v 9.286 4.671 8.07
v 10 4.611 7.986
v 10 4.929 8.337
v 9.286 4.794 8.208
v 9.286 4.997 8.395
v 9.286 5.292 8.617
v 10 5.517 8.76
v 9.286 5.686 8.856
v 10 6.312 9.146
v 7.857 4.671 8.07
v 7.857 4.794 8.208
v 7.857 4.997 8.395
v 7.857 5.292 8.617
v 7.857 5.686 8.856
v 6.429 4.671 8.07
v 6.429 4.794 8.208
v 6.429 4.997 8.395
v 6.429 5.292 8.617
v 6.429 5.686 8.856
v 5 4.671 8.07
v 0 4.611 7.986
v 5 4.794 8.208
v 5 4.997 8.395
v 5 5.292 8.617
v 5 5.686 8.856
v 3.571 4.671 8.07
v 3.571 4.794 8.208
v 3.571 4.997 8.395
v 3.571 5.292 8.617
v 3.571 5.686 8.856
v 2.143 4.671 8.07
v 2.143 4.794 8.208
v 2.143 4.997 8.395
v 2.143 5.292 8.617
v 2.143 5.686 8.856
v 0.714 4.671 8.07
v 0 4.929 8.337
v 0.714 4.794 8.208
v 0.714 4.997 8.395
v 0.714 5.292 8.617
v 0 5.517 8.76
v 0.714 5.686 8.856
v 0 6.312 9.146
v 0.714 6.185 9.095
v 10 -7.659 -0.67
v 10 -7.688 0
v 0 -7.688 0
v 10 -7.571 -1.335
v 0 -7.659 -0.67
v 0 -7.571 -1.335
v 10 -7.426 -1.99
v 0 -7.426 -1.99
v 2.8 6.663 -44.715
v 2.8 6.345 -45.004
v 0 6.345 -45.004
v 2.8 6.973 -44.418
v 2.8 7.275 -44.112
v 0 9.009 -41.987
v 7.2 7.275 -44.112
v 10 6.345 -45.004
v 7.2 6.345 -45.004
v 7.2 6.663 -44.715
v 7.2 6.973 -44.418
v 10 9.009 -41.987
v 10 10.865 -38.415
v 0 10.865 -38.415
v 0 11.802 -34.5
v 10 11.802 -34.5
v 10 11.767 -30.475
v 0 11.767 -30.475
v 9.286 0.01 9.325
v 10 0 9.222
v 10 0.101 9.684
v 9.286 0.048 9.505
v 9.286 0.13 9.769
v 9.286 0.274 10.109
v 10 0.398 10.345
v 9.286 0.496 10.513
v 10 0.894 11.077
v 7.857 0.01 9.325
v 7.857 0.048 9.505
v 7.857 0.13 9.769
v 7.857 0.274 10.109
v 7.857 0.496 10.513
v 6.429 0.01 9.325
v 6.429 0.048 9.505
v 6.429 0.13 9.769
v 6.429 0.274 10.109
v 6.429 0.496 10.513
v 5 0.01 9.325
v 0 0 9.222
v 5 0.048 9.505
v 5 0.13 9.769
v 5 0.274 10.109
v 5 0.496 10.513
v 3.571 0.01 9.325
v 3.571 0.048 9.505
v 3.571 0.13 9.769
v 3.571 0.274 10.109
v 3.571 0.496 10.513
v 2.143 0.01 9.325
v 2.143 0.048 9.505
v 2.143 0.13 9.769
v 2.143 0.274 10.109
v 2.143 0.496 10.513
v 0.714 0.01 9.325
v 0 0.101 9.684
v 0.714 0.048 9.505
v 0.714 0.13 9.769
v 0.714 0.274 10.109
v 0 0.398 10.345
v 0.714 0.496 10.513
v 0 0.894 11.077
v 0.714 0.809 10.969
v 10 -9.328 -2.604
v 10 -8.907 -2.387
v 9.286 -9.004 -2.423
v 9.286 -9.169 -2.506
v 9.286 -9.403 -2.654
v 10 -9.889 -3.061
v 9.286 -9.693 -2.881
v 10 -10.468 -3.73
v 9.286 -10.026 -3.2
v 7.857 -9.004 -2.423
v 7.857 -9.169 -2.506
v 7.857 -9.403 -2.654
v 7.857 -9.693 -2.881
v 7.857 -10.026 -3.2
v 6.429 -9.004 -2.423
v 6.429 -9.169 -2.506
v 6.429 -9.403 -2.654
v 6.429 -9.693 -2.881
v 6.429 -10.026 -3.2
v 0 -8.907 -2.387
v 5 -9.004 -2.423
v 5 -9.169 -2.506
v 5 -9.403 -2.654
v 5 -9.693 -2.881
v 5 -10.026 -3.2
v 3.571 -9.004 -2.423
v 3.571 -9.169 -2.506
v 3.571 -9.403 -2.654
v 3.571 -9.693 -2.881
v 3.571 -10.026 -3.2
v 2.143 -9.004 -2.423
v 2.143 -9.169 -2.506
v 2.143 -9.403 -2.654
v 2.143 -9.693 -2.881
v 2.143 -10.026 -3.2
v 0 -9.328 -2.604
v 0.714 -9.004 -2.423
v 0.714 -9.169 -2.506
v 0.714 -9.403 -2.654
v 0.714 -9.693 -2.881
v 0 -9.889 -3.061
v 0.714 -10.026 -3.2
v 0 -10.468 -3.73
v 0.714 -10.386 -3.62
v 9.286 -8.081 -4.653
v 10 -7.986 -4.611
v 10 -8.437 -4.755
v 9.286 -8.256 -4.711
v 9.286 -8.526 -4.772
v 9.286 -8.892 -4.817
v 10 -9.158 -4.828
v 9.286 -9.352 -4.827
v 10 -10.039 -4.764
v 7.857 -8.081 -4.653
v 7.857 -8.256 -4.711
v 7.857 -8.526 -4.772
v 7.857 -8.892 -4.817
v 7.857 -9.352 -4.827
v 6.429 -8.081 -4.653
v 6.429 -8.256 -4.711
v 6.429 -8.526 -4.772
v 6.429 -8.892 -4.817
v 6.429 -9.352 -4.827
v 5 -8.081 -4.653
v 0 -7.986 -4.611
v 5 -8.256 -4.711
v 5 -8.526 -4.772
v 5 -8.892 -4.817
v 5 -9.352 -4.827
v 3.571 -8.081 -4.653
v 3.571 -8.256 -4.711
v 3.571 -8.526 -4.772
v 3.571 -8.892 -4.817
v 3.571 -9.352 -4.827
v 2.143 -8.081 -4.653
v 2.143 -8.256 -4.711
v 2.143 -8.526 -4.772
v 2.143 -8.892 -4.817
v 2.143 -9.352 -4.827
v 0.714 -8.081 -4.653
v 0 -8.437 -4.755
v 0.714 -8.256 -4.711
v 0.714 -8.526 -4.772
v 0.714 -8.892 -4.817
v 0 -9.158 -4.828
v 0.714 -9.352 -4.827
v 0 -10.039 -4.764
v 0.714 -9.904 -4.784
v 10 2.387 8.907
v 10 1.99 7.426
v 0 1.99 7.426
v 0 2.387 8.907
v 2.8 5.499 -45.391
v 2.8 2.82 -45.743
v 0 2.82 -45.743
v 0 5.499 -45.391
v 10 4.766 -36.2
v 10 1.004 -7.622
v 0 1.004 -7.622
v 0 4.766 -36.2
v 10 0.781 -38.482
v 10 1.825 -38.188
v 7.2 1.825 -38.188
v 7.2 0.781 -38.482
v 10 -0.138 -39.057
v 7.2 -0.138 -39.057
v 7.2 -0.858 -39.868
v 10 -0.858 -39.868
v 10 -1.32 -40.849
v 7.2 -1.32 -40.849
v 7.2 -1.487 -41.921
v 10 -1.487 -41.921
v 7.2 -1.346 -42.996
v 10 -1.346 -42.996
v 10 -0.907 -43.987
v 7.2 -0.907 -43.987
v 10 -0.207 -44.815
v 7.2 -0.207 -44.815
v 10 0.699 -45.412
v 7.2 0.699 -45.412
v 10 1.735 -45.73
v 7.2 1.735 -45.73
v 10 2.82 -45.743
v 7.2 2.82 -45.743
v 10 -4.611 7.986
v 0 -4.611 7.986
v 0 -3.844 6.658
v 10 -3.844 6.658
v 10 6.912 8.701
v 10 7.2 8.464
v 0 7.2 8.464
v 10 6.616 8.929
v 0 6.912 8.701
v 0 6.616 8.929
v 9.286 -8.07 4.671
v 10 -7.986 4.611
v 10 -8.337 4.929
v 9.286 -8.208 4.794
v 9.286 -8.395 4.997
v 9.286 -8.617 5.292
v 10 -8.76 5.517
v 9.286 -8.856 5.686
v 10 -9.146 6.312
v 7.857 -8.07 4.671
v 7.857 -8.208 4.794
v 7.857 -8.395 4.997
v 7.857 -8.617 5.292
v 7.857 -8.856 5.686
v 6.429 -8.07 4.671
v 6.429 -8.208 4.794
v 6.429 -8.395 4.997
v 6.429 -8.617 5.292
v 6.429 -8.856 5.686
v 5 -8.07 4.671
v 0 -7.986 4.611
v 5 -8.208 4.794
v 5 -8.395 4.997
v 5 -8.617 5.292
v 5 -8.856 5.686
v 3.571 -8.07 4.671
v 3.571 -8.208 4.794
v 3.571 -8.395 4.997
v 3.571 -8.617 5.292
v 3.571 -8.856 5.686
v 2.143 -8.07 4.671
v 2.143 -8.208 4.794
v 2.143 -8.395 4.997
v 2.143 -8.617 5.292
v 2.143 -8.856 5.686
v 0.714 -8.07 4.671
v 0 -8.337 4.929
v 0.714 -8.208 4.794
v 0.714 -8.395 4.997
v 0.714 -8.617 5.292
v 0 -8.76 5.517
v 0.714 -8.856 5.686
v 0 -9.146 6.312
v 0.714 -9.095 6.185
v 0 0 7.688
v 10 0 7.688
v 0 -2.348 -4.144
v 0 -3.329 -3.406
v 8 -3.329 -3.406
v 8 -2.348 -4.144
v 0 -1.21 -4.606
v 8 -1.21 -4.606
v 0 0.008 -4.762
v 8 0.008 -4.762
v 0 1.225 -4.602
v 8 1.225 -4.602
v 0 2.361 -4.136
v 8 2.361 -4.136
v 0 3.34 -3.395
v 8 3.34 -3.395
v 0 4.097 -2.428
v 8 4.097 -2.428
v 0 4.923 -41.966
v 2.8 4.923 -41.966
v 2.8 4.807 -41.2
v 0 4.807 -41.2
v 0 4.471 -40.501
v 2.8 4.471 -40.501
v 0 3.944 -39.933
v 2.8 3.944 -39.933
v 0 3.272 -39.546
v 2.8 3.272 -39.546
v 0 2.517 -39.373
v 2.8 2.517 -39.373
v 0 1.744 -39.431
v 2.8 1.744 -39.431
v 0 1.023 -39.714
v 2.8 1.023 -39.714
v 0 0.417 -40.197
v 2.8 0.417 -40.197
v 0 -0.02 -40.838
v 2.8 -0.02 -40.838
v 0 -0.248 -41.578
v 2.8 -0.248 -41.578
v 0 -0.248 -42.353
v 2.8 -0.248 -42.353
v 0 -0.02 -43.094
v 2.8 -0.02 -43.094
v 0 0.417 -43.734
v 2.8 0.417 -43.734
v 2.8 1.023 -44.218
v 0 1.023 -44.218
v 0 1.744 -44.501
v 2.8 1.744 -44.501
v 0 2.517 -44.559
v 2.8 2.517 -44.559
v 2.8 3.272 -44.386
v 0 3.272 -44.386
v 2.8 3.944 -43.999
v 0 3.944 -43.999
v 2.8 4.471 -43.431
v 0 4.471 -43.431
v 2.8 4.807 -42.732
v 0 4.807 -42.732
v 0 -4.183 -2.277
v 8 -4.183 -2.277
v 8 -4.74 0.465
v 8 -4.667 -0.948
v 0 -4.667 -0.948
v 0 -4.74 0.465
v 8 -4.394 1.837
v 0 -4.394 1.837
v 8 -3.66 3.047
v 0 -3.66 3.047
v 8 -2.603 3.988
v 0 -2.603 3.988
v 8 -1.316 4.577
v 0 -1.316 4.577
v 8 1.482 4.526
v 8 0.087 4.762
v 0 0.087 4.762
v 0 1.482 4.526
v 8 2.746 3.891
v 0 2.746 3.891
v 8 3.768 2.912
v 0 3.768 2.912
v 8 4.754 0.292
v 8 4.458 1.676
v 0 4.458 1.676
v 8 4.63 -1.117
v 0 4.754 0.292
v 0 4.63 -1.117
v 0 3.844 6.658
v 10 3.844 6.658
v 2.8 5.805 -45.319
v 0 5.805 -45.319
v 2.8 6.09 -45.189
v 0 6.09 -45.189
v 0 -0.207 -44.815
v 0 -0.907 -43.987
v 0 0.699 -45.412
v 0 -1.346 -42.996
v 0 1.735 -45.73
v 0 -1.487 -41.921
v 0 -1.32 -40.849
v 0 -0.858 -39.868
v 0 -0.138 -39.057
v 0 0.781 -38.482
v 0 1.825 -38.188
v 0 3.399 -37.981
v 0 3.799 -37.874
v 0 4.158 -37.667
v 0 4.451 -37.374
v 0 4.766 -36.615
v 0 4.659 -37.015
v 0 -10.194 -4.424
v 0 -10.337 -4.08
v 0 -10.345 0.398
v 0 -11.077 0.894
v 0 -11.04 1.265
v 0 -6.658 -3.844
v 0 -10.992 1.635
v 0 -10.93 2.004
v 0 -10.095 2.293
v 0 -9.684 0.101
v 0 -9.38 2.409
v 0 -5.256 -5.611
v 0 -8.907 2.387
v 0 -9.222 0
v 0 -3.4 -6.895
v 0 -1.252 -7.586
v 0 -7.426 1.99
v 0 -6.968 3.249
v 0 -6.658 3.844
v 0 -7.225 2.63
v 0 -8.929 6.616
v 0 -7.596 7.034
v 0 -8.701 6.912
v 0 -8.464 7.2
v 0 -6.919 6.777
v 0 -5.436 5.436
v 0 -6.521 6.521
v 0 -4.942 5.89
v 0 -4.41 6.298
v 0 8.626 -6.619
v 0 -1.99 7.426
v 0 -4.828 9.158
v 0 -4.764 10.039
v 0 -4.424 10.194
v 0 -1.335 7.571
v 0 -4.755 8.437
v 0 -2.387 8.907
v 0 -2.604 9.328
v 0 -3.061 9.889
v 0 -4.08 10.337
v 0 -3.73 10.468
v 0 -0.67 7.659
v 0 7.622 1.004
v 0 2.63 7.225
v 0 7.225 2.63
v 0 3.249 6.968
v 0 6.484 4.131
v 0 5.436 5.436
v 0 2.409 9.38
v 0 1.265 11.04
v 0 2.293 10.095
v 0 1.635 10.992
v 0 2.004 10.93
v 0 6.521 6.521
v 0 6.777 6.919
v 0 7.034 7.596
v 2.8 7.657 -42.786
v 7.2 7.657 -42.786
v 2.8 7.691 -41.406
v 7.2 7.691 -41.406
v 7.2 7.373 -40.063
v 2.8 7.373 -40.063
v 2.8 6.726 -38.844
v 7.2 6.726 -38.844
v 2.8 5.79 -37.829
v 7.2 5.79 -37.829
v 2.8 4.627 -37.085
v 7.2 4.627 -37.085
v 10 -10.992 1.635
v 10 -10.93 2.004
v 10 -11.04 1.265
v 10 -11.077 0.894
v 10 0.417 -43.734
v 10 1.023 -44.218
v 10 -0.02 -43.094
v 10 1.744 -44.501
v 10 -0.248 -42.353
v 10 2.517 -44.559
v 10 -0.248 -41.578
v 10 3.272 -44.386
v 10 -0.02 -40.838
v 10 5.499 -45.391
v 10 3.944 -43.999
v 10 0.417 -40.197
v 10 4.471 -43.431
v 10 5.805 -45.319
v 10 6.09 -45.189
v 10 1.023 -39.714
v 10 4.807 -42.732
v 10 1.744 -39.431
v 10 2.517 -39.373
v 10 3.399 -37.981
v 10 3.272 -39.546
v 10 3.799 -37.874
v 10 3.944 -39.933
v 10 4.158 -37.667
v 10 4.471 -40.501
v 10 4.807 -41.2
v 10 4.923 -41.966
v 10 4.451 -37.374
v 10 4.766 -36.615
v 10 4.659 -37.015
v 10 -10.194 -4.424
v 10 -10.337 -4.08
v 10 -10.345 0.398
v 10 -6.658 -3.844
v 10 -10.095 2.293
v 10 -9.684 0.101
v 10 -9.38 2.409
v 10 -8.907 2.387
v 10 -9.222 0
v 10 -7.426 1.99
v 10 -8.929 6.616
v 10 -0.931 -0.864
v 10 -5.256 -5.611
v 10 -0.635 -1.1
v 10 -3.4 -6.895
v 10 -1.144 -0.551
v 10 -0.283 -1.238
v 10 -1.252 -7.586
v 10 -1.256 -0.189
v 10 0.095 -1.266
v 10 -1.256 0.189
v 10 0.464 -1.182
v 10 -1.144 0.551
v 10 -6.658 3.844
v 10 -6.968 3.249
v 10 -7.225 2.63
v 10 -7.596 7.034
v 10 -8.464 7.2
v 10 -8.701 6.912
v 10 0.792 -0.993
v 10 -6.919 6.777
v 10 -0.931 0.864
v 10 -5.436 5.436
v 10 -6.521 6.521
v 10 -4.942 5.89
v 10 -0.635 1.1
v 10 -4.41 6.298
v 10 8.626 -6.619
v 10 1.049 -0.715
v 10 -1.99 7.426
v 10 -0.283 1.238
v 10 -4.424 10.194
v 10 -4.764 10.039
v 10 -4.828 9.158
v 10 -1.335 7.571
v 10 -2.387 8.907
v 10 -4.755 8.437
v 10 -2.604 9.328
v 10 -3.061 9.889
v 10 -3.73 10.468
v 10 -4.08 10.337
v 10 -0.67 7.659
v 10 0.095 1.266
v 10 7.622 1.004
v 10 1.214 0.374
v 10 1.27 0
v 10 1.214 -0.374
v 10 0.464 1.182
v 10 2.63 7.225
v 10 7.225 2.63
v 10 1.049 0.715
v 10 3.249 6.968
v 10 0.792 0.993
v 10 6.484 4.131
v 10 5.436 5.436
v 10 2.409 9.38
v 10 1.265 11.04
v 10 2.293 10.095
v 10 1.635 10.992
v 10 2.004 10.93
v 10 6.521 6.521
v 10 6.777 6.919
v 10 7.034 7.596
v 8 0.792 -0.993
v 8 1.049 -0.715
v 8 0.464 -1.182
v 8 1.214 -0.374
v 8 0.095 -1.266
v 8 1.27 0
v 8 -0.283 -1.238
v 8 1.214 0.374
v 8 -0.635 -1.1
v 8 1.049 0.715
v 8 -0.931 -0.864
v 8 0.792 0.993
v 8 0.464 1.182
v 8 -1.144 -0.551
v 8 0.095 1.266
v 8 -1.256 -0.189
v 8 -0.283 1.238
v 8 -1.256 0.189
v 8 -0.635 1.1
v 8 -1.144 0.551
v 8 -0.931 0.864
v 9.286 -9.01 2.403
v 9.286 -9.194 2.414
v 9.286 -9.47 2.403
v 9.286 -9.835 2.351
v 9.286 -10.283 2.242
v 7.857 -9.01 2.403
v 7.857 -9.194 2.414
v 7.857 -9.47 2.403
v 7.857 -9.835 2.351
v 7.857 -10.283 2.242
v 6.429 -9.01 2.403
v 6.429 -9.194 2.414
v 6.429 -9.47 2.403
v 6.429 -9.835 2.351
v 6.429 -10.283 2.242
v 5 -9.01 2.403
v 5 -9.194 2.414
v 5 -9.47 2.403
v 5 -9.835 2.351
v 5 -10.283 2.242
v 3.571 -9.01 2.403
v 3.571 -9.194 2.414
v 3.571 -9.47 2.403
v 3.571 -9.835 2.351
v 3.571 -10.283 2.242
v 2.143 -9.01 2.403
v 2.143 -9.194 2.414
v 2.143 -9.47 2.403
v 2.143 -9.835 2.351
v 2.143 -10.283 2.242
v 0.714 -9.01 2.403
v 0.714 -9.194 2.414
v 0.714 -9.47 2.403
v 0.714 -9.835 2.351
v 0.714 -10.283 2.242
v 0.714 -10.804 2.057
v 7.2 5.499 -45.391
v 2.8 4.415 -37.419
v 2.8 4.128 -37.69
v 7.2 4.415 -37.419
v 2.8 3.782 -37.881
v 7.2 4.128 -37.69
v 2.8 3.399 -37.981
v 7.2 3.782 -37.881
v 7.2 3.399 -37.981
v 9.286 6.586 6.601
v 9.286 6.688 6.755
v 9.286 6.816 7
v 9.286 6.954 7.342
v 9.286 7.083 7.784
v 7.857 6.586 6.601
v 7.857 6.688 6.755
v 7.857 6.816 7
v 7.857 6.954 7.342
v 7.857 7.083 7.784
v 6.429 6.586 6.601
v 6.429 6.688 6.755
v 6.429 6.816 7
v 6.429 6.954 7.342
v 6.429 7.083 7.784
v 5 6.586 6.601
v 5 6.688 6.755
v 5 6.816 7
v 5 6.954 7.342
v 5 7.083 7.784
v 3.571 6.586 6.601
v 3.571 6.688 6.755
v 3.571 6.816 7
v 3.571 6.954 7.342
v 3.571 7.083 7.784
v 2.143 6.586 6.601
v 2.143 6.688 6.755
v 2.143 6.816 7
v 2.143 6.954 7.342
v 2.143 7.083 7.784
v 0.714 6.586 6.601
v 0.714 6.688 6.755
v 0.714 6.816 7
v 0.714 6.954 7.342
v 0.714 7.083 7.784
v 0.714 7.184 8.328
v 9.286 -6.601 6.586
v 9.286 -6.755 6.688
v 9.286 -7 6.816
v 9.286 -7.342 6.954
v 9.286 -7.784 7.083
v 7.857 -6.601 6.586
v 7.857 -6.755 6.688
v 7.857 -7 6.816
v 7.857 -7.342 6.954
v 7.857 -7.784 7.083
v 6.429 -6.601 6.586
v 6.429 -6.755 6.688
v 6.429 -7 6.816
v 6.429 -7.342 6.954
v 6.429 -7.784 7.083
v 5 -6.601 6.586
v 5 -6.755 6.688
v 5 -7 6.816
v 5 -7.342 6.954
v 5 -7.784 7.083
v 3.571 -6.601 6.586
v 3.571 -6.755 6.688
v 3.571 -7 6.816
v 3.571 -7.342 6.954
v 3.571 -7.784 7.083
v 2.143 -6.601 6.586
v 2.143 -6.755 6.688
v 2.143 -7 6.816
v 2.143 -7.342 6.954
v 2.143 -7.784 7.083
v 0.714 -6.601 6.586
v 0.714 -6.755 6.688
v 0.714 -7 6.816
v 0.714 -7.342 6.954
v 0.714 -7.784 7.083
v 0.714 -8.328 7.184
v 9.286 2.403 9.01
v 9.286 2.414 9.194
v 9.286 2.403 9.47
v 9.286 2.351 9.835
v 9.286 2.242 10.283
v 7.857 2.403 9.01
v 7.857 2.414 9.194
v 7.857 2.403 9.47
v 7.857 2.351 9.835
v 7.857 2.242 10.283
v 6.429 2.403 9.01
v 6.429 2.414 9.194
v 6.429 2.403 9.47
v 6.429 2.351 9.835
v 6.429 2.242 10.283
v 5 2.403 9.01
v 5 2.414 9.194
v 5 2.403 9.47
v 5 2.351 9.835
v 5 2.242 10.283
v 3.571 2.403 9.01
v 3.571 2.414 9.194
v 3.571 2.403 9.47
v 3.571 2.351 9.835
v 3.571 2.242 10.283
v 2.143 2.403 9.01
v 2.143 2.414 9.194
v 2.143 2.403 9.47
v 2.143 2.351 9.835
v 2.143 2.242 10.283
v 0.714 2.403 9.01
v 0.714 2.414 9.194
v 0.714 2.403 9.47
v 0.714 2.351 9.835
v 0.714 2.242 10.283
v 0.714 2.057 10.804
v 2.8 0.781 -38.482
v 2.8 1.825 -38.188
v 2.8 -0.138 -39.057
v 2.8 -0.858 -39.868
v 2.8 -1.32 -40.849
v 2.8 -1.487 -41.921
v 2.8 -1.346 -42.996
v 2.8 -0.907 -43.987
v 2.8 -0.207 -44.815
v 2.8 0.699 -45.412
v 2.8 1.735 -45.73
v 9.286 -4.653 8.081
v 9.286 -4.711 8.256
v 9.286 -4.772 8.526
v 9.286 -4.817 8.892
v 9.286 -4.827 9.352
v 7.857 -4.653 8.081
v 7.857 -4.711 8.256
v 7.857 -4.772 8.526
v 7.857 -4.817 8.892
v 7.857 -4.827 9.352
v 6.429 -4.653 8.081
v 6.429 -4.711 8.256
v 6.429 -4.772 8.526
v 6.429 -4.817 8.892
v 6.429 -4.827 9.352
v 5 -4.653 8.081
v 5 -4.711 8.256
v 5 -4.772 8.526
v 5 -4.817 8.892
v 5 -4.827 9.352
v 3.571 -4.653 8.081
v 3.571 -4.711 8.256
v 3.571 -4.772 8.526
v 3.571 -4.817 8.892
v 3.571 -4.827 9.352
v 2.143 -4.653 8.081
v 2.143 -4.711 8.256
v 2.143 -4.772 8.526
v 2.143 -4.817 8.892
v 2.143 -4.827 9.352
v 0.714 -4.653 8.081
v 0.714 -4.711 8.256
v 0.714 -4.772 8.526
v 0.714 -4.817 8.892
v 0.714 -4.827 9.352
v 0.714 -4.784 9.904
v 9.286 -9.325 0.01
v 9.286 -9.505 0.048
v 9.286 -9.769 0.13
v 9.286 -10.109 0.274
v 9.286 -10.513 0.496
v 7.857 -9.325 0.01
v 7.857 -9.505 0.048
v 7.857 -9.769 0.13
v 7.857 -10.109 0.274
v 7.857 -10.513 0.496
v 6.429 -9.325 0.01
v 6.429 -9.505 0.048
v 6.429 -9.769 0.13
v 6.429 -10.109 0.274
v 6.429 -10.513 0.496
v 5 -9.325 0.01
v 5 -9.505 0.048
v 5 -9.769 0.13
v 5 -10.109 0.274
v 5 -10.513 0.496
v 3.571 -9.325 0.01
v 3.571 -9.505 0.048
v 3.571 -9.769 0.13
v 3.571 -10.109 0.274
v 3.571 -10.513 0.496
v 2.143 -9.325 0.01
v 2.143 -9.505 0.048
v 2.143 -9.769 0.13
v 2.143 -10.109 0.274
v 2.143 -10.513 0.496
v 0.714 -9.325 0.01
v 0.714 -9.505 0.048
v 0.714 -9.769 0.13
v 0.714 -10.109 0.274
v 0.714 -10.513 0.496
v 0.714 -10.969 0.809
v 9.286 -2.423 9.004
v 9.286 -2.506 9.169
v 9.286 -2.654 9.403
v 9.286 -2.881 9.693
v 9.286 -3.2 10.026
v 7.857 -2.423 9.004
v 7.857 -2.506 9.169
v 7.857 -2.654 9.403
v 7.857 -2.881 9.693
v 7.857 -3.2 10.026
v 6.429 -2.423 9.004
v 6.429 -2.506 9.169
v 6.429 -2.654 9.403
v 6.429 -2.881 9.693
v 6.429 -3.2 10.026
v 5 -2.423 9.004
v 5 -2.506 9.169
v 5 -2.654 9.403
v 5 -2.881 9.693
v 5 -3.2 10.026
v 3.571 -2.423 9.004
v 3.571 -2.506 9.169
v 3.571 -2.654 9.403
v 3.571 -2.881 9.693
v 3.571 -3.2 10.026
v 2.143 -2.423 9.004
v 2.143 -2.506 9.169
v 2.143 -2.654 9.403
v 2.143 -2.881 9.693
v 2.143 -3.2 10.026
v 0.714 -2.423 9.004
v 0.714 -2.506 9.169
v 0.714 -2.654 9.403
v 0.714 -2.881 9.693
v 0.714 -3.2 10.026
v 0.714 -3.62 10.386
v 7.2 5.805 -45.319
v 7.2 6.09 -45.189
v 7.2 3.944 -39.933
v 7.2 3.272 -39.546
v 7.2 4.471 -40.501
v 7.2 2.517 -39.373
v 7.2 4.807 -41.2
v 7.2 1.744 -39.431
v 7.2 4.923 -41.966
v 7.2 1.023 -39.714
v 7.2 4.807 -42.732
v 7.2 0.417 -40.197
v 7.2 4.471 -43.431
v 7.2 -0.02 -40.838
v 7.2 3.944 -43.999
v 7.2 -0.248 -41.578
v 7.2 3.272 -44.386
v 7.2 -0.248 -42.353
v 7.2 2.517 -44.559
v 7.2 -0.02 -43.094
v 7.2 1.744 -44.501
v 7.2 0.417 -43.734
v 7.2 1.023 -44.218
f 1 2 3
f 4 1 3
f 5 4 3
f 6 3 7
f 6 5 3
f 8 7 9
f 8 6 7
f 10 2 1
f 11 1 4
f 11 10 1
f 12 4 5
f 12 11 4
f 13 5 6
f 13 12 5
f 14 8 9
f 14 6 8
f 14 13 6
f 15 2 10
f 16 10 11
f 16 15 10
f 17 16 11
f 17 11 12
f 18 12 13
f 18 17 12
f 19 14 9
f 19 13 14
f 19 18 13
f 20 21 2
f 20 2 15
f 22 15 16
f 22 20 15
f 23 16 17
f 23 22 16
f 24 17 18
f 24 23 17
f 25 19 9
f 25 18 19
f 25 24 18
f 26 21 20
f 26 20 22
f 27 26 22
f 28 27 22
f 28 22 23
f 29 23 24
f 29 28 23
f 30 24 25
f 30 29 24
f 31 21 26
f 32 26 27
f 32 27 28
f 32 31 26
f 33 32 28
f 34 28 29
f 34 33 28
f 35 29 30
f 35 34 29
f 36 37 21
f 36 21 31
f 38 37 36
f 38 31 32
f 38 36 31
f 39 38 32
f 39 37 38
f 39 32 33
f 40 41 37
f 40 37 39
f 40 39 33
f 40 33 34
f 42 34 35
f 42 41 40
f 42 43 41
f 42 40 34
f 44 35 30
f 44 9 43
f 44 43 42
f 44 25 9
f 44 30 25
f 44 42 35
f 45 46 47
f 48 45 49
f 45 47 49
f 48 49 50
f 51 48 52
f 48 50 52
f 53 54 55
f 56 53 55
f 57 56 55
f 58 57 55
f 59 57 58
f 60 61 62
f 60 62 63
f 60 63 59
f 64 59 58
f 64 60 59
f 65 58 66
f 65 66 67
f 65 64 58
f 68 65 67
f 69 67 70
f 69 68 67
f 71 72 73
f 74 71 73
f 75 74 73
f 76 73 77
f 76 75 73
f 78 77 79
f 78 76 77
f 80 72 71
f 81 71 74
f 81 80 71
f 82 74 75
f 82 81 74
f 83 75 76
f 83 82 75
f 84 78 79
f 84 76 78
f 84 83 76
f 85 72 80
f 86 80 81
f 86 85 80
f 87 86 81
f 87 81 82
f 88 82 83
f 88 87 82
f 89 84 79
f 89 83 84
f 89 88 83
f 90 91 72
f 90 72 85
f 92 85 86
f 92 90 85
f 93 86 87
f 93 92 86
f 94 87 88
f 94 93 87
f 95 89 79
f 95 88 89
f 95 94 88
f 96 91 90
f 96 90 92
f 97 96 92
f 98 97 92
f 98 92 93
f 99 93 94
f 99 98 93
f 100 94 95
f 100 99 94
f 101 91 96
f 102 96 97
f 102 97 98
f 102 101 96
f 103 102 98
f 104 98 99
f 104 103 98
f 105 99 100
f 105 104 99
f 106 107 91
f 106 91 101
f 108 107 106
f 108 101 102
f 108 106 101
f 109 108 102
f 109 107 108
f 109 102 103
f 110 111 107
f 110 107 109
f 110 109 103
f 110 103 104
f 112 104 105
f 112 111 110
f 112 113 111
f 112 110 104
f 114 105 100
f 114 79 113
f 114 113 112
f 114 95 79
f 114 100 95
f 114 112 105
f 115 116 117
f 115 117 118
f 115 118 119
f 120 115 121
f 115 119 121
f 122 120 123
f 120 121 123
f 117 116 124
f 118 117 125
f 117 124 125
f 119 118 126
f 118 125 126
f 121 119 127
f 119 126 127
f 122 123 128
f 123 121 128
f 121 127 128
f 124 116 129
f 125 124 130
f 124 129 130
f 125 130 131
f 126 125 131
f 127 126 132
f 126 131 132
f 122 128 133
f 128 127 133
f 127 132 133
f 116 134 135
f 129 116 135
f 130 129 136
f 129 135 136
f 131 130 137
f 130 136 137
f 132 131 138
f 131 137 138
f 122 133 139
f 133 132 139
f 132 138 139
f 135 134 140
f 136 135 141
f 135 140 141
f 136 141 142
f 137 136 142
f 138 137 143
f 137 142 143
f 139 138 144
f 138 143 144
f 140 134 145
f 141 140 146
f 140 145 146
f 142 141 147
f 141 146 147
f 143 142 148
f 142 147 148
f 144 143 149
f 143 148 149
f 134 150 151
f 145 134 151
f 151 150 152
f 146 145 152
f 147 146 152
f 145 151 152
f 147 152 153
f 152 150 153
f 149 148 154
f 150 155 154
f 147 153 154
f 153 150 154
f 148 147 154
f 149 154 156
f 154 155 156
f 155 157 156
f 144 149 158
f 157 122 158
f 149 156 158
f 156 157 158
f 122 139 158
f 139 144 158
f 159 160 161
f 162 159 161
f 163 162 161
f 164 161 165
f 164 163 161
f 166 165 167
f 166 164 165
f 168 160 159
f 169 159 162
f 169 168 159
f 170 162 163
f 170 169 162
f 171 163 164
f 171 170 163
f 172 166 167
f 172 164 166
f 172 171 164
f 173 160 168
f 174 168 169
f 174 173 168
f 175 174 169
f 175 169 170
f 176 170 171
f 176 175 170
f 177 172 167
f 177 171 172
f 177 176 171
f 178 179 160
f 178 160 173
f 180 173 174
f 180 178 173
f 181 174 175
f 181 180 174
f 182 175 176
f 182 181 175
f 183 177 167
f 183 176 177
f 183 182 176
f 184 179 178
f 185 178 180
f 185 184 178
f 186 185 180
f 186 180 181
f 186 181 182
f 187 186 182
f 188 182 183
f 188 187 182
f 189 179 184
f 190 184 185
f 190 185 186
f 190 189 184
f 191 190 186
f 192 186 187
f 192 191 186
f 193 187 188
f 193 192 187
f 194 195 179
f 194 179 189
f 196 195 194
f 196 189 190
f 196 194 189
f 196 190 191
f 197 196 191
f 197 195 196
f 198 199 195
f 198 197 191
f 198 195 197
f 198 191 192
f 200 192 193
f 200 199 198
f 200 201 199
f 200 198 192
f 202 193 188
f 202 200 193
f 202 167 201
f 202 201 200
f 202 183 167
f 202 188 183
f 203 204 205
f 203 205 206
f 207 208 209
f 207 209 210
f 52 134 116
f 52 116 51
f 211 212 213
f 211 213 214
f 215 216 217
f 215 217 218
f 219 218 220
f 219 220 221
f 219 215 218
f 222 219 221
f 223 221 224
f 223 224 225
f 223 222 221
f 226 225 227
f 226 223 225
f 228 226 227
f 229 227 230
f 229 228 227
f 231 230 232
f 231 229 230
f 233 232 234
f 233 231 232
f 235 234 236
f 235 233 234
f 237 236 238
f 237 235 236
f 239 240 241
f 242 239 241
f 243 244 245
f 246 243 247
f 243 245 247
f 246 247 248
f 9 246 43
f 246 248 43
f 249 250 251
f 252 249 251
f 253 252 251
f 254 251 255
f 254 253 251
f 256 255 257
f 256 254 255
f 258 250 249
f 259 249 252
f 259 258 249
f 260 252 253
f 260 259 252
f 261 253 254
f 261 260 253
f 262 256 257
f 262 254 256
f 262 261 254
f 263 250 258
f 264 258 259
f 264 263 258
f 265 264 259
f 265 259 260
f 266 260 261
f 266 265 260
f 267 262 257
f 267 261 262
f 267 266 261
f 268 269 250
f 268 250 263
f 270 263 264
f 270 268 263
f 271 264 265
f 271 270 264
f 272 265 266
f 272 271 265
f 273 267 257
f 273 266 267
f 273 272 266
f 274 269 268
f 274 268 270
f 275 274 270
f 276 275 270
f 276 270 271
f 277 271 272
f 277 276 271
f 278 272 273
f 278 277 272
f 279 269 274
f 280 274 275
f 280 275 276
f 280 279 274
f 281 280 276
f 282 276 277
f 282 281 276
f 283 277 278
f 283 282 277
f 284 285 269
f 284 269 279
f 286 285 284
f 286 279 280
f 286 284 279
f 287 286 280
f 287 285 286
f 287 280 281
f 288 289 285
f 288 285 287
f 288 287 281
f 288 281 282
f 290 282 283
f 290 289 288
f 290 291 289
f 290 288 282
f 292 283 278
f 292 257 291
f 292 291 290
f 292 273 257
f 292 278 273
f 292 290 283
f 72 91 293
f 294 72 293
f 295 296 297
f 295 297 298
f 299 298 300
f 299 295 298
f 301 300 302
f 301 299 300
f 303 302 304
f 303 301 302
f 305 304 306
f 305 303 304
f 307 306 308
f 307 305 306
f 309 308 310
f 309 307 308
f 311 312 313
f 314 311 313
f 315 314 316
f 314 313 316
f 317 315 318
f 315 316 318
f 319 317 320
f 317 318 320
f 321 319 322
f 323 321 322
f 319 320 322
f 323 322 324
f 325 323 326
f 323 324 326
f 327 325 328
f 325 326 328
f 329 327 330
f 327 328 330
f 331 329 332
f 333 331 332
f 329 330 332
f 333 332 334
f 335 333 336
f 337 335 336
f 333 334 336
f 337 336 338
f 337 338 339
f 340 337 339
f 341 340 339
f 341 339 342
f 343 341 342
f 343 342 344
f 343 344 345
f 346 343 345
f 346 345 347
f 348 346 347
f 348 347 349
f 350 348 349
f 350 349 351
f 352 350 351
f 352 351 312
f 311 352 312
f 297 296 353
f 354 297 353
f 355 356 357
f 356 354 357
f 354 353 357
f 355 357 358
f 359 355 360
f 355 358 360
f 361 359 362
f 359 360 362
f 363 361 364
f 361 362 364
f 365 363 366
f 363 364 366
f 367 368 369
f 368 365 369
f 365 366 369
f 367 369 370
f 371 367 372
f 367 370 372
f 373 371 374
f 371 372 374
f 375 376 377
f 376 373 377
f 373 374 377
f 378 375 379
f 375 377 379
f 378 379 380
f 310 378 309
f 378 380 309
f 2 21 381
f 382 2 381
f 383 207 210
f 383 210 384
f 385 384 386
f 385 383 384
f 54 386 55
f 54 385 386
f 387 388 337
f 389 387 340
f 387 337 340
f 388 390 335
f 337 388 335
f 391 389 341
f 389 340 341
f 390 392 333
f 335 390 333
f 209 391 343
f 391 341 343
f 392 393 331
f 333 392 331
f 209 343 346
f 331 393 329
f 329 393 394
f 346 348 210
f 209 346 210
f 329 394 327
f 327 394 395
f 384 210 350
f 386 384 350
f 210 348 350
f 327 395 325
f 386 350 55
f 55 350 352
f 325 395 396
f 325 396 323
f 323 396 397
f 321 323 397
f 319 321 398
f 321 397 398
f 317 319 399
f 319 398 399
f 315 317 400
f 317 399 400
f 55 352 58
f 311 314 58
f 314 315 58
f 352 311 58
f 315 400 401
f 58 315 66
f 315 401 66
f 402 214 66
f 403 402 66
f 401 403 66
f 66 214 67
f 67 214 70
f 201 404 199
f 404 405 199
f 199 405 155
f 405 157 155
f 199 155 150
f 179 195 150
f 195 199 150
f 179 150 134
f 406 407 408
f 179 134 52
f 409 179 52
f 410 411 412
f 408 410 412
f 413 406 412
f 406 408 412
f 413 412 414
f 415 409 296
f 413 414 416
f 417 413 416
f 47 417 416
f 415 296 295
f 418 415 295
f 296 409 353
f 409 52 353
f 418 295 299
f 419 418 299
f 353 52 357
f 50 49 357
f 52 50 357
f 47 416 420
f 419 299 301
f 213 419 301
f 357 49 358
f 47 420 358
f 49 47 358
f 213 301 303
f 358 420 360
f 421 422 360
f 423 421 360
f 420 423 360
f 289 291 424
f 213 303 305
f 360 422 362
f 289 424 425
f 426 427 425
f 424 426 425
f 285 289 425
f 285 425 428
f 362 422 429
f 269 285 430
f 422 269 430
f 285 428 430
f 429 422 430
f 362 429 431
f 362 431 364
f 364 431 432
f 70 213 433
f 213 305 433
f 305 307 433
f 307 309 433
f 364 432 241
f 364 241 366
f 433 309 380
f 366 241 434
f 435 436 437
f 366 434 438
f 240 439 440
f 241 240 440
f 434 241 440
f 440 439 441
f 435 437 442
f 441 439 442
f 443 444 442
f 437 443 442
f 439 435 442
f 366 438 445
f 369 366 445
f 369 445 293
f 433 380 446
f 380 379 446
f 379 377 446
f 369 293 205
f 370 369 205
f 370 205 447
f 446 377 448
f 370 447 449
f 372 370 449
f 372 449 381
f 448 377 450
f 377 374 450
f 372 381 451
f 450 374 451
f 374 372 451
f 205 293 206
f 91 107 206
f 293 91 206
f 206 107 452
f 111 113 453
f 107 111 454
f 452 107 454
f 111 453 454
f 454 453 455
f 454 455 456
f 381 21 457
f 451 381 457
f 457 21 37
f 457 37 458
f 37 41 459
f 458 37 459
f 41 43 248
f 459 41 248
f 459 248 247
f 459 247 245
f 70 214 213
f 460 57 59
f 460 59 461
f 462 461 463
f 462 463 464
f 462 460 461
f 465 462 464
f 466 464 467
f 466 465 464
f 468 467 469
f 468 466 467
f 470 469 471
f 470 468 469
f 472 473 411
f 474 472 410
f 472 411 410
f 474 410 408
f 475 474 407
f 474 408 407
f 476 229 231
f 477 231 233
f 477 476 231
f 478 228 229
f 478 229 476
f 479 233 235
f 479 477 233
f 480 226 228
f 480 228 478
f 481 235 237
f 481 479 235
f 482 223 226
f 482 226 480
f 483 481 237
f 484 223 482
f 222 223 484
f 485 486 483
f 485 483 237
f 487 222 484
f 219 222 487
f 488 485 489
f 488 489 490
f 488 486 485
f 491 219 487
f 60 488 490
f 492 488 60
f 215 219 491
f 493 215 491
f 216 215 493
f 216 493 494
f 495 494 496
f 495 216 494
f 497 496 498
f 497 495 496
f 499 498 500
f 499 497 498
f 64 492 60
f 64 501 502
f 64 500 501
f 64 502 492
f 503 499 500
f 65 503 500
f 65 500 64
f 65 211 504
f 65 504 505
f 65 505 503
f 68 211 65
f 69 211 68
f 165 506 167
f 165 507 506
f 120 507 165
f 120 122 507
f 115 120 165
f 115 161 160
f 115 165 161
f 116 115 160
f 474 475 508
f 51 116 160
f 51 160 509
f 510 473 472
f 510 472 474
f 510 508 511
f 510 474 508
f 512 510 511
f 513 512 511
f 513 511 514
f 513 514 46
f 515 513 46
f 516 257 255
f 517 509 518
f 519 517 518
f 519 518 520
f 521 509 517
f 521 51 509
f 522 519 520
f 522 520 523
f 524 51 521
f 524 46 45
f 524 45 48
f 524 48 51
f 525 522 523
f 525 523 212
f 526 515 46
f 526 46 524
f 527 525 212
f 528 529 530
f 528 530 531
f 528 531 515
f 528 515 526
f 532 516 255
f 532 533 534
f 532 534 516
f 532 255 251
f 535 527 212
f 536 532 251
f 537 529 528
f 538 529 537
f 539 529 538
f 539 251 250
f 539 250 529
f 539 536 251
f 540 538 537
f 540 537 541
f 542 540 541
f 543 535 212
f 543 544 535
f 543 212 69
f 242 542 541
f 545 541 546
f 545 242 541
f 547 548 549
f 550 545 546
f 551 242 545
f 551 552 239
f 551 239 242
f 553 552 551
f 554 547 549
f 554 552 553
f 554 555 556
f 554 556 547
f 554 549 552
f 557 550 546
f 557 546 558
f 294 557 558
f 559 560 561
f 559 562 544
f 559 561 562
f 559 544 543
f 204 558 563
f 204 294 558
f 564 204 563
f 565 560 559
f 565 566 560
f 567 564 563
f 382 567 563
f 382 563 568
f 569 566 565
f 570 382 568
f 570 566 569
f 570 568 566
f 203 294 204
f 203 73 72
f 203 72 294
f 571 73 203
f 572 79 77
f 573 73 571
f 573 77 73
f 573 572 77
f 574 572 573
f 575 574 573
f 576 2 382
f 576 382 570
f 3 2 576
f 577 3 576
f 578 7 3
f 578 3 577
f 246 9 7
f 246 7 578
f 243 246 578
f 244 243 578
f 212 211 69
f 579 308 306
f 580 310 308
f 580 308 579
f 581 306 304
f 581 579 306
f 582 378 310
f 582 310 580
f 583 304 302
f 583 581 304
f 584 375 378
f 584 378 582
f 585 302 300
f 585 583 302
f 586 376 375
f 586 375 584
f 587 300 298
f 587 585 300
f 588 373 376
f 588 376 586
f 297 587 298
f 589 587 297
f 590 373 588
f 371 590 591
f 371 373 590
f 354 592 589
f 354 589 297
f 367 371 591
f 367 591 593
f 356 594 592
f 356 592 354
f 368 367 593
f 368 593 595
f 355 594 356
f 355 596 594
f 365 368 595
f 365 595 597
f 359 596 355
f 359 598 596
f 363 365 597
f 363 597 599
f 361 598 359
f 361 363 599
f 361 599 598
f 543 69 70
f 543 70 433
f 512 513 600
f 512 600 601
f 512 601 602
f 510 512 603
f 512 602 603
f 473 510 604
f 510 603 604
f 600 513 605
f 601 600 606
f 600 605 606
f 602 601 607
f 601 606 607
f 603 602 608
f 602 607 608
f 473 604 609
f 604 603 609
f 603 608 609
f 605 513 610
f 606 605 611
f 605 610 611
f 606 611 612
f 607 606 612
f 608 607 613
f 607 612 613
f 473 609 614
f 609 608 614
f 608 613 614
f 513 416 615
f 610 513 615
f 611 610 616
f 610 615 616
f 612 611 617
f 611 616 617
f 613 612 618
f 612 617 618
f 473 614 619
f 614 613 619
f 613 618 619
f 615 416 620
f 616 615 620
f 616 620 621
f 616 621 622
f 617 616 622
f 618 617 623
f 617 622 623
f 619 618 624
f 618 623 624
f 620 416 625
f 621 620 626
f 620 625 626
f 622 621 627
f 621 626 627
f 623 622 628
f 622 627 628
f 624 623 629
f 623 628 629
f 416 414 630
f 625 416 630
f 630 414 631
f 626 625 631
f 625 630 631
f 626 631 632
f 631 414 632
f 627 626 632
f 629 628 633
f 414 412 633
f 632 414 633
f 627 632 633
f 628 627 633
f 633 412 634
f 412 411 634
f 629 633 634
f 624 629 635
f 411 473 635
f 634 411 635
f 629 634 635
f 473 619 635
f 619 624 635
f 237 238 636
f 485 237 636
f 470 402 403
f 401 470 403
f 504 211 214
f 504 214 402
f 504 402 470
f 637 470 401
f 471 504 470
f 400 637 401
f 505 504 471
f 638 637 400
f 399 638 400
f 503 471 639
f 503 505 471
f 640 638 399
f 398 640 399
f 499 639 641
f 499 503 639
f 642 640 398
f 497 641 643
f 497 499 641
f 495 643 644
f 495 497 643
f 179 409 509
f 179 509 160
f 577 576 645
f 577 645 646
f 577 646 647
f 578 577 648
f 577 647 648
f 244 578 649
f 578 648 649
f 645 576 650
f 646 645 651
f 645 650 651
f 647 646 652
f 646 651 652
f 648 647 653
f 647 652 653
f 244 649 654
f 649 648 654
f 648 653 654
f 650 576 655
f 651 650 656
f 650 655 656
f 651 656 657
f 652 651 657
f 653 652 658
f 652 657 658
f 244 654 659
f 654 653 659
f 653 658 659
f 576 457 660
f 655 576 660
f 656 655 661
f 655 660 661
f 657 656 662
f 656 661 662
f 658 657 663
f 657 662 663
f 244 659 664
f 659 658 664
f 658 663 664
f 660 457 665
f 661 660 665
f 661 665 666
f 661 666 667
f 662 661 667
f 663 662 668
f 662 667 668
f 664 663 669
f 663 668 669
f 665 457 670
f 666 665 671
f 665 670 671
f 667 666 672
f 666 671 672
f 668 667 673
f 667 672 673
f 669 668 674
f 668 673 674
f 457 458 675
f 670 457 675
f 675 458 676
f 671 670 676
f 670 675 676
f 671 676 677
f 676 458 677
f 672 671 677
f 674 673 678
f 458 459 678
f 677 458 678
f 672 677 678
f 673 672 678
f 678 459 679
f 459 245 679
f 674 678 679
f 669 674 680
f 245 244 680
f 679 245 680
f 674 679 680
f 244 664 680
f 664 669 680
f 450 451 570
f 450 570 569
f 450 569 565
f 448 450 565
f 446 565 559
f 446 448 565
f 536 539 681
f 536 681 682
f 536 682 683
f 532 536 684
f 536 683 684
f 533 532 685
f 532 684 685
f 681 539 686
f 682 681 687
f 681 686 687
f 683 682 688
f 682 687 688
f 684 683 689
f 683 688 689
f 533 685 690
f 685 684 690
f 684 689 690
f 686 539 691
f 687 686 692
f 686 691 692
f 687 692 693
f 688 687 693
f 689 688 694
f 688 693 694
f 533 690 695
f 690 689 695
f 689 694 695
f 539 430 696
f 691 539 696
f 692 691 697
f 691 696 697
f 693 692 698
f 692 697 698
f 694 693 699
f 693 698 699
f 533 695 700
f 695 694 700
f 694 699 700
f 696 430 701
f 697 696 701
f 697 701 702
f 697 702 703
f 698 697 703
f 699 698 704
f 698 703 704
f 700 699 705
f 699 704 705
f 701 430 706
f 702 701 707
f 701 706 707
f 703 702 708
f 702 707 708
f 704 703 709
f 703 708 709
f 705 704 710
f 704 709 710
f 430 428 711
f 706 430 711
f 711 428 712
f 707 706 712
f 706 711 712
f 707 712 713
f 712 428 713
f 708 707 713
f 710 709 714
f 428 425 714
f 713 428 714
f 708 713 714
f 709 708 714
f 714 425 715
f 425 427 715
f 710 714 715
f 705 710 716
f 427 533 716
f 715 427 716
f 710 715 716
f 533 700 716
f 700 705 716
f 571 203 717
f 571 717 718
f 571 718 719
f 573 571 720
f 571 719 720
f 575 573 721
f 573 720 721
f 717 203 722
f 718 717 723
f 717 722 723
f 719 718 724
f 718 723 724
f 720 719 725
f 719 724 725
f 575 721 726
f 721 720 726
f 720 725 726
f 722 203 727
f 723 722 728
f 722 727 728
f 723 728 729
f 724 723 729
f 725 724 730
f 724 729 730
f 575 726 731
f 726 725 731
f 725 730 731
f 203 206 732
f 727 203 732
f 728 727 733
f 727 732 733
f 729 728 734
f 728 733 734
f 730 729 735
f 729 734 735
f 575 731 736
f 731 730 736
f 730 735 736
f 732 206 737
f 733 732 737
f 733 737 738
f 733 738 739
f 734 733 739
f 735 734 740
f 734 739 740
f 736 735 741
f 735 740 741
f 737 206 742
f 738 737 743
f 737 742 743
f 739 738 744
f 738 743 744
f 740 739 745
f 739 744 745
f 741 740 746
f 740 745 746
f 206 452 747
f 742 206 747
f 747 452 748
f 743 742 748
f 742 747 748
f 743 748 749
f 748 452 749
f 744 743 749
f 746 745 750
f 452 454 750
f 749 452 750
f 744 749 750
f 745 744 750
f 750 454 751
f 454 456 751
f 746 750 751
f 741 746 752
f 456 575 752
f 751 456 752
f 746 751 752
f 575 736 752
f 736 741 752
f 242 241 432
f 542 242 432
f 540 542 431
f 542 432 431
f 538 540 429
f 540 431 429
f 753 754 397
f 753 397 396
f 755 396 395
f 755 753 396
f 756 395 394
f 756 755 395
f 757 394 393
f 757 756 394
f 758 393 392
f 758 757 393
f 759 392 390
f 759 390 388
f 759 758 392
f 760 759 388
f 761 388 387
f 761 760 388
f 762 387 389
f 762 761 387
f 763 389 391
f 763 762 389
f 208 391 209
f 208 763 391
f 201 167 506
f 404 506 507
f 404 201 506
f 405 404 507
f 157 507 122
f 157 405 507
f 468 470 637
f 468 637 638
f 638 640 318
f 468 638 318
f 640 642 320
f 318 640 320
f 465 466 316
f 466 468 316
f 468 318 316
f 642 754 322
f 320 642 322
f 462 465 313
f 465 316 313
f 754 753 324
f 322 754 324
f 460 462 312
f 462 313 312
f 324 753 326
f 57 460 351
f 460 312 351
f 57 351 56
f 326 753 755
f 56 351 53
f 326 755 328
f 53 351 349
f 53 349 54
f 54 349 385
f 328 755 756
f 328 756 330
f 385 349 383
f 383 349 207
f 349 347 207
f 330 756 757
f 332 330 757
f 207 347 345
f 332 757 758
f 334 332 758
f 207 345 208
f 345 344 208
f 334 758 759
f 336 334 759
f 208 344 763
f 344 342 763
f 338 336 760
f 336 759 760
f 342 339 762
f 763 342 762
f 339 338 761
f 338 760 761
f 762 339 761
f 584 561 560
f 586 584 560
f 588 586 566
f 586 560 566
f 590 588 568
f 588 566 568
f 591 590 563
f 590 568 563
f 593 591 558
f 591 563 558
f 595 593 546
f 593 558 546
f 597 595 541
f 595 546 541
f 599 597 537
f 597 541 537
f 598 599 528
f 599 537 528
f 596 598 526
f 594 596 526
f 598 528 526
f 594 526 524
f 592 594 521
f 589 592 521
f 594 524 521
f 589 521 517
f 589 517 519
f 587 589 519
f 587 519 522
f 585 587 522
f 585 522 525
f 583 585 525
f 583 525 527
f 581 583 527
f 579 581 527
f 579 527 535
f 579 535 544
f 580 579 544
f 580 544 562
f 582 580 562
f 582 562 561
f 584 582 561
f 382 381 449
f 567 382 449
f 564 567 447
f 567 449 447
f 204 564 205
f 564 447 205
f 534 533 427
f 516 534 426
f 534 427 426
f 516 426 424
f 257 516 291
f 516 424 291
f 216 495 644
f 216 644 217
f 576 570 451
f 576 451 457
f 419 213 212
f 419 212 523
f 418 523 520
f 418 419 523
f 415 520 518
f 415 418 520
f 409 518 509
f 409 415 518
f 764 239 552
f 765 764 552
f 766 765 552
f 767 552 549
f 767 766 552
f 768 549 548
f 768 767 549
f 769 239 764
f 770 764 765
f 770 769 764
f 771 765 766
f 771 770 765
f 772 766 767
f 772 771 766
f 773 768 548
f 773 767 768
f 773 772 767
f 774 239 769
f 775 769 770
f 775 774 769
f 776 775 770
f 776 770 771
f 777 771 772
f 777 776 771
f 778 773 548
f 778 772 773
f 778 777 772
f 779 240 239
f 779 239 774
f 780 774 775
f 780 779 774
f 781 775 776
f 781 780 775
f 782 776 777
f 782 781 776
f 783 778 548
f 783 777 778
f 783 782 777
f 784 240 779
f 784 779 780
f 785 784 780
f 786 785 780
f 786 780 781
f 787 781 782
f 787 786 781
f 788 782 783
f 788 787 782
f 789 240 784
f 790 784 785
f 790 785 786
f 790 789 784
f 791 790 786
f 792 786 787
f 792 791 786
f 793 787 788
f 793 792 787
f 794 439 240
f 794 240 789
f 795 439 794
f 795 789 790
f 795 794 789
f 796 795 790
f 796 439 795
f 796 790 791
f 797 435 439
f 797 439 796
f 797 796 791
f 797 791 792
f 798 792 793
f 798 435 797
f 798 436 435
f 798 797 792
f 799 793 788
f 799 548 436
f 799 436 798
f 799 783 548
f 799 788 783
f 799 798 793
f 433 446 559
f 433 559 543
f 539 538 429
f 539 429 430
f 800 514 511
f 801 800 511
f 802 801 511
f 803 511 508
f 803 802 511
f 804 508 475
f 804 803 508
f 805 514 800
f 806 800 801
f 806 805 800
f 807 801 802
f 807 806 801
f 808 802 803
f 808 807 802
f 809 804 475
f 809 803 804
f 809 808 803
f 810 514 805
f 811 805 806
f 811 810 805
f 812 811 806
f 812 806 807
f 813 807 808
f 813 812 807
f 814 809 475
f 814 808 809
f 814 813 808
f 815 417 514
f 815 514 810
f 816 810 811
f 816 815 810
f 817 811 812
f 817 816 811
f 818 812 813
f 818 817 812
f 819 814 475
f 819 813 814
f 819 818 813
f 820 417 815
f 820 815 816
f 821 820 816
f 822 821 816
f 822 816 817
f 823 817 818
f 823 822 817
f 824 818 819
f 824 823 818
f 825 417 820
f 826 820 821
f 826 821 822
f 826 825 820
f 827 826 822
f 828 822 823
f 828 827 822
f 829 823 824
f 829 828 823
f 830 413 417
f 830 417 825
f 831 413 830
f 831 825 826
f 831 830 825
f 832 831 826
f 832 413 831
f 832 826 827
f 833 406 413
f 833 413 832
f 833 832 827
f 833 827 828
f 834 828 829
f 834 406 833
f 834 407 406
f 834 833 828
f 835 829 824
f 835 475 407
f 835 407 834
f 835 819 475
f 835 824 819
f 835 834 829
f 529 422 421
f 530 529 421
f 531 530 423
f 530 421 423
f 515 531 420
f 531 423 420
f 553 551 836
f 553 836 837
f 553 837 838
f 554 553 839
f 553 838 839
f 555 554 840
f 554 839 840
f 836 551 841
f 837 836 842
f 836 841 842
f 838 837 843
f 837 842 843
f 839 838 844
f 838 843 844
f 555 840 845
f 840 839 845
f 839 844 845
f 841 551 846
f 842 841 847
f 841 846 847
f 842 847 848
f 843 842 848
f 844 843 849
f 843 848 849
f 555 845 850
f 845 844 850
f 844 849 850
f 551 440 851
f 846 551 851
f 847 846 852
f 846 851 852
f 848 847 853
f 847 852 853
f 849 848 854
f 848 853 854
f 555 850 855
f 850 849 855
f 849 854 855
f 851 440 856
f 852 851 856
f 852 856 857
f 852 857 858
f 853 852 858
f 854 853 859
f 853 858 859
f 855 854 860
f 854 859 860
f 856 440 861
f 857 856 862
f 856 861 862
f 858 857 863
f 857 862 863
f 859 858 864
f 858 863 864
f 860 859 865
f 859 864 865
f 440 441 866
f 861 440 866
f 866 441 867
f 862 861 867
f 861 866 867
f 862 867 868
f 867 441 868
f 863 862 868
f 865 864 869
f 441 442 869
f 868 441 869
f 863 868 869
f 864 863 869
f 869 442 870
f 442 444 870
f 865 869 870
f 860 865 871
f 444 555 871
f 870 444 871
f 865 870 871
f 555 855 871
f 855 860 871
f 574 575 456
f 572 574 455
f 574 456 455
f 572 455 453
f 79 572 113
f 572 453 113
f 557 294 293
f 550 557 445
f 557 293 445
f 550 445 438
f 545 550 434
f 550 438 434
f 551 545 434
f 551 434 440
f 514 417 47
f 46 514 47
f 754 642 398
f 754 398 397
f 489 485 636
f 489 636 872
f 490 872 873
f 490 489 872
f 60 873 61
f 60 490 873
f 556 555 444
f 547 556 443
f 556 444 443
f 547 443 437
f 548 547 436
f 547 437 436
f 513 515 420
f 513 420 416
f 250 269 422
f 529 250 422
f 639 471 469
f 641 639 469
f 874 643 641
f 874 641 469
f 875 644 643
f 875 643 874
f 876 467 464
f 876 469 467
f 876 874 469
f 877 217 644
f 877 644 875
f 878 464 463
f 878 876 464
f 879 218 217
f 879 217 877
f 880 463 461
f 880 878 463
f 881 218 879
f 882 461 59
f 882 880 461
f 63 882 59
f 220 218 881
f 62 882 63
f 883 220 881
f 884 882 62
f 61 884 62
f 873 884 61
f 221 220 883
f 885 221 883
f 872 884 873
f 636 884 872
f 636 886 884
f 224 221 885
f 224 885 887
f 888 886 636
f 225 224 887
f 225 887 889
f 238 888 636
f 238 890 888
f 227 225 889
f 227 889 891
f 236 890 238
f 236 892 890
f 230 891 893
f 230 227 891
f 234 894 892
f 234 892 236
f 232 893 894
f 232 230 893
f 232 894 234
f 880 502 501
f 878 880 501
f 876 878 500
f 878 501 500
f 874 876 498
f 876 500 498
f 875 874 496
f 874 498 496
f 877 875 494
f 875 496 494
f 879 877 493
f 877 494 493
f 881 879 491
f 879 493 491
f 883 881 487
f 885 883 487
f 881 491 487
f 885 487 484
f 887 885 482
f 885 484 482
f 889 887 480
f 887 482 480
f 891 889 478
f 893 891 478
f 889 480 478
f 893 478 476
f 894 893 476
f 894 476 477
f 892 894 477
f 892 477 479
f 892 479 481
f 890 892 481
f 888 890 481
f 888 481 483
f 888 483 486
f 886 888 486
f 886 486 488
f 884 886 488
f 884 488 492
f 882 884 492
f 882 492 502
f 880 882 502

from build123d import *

# Parameters (mm, degrees)
F3_DEPTH        = 10
F3_COPIES_COUNT = 5
F3_COPIES_ANGLE = 120
F5_R            = 4.7625
F6_DEPTH        = 8
F7_R            = 1.27
F8_DEPTH        = 25.4
F10_DEPTH       = 25.4
F12_DEPTH       = 10
F15_DEPTH       = 2
F17_R           = 2.6
F18_DEPTH       = 10
F20_W           = 4.4
F20_H           = 5.3975


# Not quite as in the source:
# - a feature of the source that left no trace in its solid (it failed there, or was rolled back) is left out
# - a pattern or mirror of a feature is missing from the dataset's text; its kind, count and spacing are read off the source's solid
# - a feature names something its author has since deleted; it is built from what else it names


with BuildPart() as f3:
    # F2 (on Right) → F3 (new body)
    with BuildSketch(Plane.YZ):
        with BuildLine():
            ThreePointArc((-7.6882625, 0), (0, -7.6882625), (7.6882625, 0))
            ThreePointArc((7.6882625, 0), (1.0035196289, 7.6224883485), (-7.426291308, 1.9898687587))
            ThreePointArc((-7.426291308, 1.9898687587), (-7.6224883485, 1.0035196289), (-7.6882625, 0))
        make_face()
        with BuildLine():
            ThreePointArc((-7.6882625, 0), (-7.6224883485, 1.0035196289), (-7.426291308, 1.9898687587))
            Line((-7.426291308, 1.9898687587), (-8.9073876605, 2.3867273303))
            add(Edge.make_bspline(
                [(-8.9073876605, 2.3867273303), (-8.9129675505, 2.3882224573), (-8.9176841258, 2.3891504576), (-8.9560398208, 2.3967560952), (-9.0111204055, 2.4040860623), (-9.0921767557, 2.4112581523), (-9.1956464181, 2.4150161111), (-9.3225341112, 2.4133585936), (-9.4721001001, 2.4038885647), (-9.6439830376, 2.3843397936), (-9.8372804848, 2.3525439817), (-10.0518635466, 2.3059720142), (-10.2838045034, 2.2438455399), (-10.5435425365, 2.158650335), (-10.7314150502, 2.0892946498), (-10.888833847, 2.0216630994), (-10.9303977099, 2.003512454)],
                knots=[0, 0, 0, 0, 0.0202164122, 0.055231725, 0.1004362437, 0.1539229332, 0.2145711301, 0.2816202297, 0.3545102827, 0.4328067574, 0.5161597183, 0.6042794907, 0.6969211254, 0.7938739525, 0.8949542617, 0.934249932, 0.934249932, 0.934249932, 0.934249932], degree=3))
            ThreePointArc((-10.9303977099, 2.003512454), (-11.017431022, 1.450472311), (-11.0765006198, 0.8937506752))
            add(Edge.make_bspline(
                [(-9.2216062746, 0), (-9.2273830018, 0), (-9.2321790478, 0.0003243601), (-9.2711962881, 0.0029050627), (-9.3262971825, 0.0100807624), (-9.406447878, 0.0241319827), (-9.5073645284, 0.0472819925), (-9.6294996312, 0.081723983), (-9.7715182587, 0.1295818548), (-9.9324848329, 0.1929510955), (-10.1109664676, 0.273692552), (-10.3061840768, 0.3742158014), (-10.5141423223, 0.4942561043), (-10.742979855, 0.6437735028), (-10.9065001958, 0.7593909349), (-11.0410507439, 0.8654609788), (-11.0765006198, 0.8937506752)],
                knots=[0, 0, 0, 0, 0.0202164122, 0.055231725, 0.1004362437, 0.1539229332, 0.2145711301, 0.2816202297, 0.3545102827, 0.4328067574, 0.5161597183, 0.6042794907, 0.6969211254, 0.7938739525, 0.8949542617, 0.934249932, 0.934249932, 0.934249932, 0.934249932], degree=3))
            Line((-9.2216062746, 0), (-7.6882625, 0))
        make_face()
    extrude(amount=F3_DEPTH)

    # F3_copies: F3 ×5 about axis
    f3_copies_axis = Axis((0, 0, 0), (-1, 0, 0))


with BuildPart() as f3_1:
    add(f3.part)
    for i in range(1, F3_COPIES_COUNT):
        add(f3.part.rotate(f3_copies_axis, i * F3_COPIES_ANGLE / (F3_COPIES_COUNT - 1)))

    # F3_copies1: F3 across plane


with BuildPart() as f3_2:
    add(f3_1.part)
    add(f3_1.part.mirror(Plane(origin=(0, 0, 0), x_dir=(0, -0.9914448614, -0.1305261922), z_dir=(0, 0.1305261922, -0.9914448614))))

    # F5 (on face) → F6 (cut)
    with BuildSketch(Plane(origin=(0, 0, 0), x_dir=(0, -1, 0), z_dir=(-1, 0, 0))):
        Circle(F5_R)
    extrude(amount=-F6_DEPTH, mode=Mode.SUBTRACT)

    # F7 (on face) → F8 (cut)
    with BuildSketch(Plane.YZ.offset(10)):
        Circle(F7_R)
    extrude(amount=-F8_DEPTH, mode=Mode.SUBTRACT)

    # F9 (on face) → F10 (cut)
    with BuildSketch(Plane.YZ.offset(10)):
        with BuildLine():
            Line((5.4364225493, 5.4364225493), (6.4313569287, -2.1208543547))
            Line((6.4313569287, -2.1208543547), (-6.658230636, -3.84413125))
            ThreePointArc((-6.658230636, -3.84413125), (-1.0393271028, -17.0218990639), (10.0434558029, -7.9445886398))
            ThreePointArc((10.0434558029, -7.9445886398), (14.9426168475, 1.225772556), (5.4364225493, 5.4364225493))
        make_face()
    extrude(amount=-F10_DEPTH, mode=Mode.SUBTRACT)

    # F11 (on face) → F12 (join)
    with BuildSketch(Plane(origin=(0, 0, 0), x_dir=(0, -1, 0), z_dir=(-1, 0, 0))):
        with BuildLine():
            ThreePointArc((3.3289323807, -3.4058208195), (-0.6216309904, -4.7217561523), (-4.0969930528, -2.4281791893))
            Line((-4.0969930528, -2.4281791893), (-6.4313569287, -2.1208543547))
            Line((-6.4313569287, -2.1208543547), (-5.4364225493, 5.4364225493))
            ThreePointArc((-5.4364225493, 5.4364225493), (-6.895393066, 3.4004315512), (-7.6224883485, 1.0035196289))
            Line((-7.6224883485, 1.0035196289), (-8.6260079774, -6.6189687196))
            Line((-8.6260079774, -6.6189687196), (-1.0035196289, -7.6224883485))
            ThreePointArc((-1.0035196289, -7.6224883485), (3.4004315512, -6.895393066), (6.658230636, -3.84413125))
            Line((6.658230636, -3.84413125), (3.3289323807, -3.4058208195))
        make_face()
    extrude(amount=-F12_DEPTH)

    # F13: union 

    # F14 (on face) → F15 (join)
    with BuildSketch(Plane.YZ.offset(10)):
        with BuildLine():
            Line((4.0969930528, -2.4281791893), (-3.3289323807, -3.4058208195))
            ThreePointArc((-3.3289323807, -3.4058208195), (0.6216309904, -4.7217561523), (4.0969930528, -2.4281791893))
        make_face()
    extrude(amount=-F15_DEPTH)

    # F16: union 

    # F17 (on face) → F18 (join)
    with BuildSketch(Plane.YZ.offset(10)):
        with BuildLine():
            Line((11.7666949515, -30.4748547197), (8.6260079774, -6.6189687196))
            Line((8.6260079774, -6.6189687196), (1.0035196289, -7.6224883485))
            Line((1.0035196289, -7.6224883485), (4.7658375934, -36.2001305009))
            ThreePointArc((4.7658375934, -36.2001305009), (4.4513673037, -37.3737495996), (3.3991292062, -37.9812595485))
            Line((3.3991292062, -37.9812595485), (1.8252104887, -38.1884698786))
            ThreePointArc((1.8252104887, -38.1884698786), (-1.4548896408, -42.4631795928), (2.8198200734, -45.7432797223))
            Line((2.8198200734, -45.7432797223), (5.4986207311, -45.3906089252))
            ThreePointArc((5.4986207311, -45.3906089252), (5.9506497242, -45.2608369332), (6.3448233333, -45.0043254397))
            ThreePointArc((6.3448233333, -45.0043254397), (10.8646203429, -38.4145914885), (11.7666949515, -30.4748547197))
        make_face()
        with Locations((2.3225152811, -41.9658748005)):
            Circle(F17_R, mode=Mode.SUBTRACT)
    extrude(amount=-F18_DEPTH)

    # F20 (on face) → F21 (revolve, cut)
    with BuildSketch(Plane(origin=(0, -3.1478374349, -0.4144206603), x_dir=(-1, 0, 0), z_dir=(0, 0.9914448614, 0.1305261922))):
        with Locations((-5, -39.21125)):
            Rectangle(F20_W, F20_H)
    revolve(axis=Axis((5.7694689557, 2.3225152811, -41.9658748005), (1, 0, 0)), mode=Mode.SUBTRACT)


solid = f3_2.part
